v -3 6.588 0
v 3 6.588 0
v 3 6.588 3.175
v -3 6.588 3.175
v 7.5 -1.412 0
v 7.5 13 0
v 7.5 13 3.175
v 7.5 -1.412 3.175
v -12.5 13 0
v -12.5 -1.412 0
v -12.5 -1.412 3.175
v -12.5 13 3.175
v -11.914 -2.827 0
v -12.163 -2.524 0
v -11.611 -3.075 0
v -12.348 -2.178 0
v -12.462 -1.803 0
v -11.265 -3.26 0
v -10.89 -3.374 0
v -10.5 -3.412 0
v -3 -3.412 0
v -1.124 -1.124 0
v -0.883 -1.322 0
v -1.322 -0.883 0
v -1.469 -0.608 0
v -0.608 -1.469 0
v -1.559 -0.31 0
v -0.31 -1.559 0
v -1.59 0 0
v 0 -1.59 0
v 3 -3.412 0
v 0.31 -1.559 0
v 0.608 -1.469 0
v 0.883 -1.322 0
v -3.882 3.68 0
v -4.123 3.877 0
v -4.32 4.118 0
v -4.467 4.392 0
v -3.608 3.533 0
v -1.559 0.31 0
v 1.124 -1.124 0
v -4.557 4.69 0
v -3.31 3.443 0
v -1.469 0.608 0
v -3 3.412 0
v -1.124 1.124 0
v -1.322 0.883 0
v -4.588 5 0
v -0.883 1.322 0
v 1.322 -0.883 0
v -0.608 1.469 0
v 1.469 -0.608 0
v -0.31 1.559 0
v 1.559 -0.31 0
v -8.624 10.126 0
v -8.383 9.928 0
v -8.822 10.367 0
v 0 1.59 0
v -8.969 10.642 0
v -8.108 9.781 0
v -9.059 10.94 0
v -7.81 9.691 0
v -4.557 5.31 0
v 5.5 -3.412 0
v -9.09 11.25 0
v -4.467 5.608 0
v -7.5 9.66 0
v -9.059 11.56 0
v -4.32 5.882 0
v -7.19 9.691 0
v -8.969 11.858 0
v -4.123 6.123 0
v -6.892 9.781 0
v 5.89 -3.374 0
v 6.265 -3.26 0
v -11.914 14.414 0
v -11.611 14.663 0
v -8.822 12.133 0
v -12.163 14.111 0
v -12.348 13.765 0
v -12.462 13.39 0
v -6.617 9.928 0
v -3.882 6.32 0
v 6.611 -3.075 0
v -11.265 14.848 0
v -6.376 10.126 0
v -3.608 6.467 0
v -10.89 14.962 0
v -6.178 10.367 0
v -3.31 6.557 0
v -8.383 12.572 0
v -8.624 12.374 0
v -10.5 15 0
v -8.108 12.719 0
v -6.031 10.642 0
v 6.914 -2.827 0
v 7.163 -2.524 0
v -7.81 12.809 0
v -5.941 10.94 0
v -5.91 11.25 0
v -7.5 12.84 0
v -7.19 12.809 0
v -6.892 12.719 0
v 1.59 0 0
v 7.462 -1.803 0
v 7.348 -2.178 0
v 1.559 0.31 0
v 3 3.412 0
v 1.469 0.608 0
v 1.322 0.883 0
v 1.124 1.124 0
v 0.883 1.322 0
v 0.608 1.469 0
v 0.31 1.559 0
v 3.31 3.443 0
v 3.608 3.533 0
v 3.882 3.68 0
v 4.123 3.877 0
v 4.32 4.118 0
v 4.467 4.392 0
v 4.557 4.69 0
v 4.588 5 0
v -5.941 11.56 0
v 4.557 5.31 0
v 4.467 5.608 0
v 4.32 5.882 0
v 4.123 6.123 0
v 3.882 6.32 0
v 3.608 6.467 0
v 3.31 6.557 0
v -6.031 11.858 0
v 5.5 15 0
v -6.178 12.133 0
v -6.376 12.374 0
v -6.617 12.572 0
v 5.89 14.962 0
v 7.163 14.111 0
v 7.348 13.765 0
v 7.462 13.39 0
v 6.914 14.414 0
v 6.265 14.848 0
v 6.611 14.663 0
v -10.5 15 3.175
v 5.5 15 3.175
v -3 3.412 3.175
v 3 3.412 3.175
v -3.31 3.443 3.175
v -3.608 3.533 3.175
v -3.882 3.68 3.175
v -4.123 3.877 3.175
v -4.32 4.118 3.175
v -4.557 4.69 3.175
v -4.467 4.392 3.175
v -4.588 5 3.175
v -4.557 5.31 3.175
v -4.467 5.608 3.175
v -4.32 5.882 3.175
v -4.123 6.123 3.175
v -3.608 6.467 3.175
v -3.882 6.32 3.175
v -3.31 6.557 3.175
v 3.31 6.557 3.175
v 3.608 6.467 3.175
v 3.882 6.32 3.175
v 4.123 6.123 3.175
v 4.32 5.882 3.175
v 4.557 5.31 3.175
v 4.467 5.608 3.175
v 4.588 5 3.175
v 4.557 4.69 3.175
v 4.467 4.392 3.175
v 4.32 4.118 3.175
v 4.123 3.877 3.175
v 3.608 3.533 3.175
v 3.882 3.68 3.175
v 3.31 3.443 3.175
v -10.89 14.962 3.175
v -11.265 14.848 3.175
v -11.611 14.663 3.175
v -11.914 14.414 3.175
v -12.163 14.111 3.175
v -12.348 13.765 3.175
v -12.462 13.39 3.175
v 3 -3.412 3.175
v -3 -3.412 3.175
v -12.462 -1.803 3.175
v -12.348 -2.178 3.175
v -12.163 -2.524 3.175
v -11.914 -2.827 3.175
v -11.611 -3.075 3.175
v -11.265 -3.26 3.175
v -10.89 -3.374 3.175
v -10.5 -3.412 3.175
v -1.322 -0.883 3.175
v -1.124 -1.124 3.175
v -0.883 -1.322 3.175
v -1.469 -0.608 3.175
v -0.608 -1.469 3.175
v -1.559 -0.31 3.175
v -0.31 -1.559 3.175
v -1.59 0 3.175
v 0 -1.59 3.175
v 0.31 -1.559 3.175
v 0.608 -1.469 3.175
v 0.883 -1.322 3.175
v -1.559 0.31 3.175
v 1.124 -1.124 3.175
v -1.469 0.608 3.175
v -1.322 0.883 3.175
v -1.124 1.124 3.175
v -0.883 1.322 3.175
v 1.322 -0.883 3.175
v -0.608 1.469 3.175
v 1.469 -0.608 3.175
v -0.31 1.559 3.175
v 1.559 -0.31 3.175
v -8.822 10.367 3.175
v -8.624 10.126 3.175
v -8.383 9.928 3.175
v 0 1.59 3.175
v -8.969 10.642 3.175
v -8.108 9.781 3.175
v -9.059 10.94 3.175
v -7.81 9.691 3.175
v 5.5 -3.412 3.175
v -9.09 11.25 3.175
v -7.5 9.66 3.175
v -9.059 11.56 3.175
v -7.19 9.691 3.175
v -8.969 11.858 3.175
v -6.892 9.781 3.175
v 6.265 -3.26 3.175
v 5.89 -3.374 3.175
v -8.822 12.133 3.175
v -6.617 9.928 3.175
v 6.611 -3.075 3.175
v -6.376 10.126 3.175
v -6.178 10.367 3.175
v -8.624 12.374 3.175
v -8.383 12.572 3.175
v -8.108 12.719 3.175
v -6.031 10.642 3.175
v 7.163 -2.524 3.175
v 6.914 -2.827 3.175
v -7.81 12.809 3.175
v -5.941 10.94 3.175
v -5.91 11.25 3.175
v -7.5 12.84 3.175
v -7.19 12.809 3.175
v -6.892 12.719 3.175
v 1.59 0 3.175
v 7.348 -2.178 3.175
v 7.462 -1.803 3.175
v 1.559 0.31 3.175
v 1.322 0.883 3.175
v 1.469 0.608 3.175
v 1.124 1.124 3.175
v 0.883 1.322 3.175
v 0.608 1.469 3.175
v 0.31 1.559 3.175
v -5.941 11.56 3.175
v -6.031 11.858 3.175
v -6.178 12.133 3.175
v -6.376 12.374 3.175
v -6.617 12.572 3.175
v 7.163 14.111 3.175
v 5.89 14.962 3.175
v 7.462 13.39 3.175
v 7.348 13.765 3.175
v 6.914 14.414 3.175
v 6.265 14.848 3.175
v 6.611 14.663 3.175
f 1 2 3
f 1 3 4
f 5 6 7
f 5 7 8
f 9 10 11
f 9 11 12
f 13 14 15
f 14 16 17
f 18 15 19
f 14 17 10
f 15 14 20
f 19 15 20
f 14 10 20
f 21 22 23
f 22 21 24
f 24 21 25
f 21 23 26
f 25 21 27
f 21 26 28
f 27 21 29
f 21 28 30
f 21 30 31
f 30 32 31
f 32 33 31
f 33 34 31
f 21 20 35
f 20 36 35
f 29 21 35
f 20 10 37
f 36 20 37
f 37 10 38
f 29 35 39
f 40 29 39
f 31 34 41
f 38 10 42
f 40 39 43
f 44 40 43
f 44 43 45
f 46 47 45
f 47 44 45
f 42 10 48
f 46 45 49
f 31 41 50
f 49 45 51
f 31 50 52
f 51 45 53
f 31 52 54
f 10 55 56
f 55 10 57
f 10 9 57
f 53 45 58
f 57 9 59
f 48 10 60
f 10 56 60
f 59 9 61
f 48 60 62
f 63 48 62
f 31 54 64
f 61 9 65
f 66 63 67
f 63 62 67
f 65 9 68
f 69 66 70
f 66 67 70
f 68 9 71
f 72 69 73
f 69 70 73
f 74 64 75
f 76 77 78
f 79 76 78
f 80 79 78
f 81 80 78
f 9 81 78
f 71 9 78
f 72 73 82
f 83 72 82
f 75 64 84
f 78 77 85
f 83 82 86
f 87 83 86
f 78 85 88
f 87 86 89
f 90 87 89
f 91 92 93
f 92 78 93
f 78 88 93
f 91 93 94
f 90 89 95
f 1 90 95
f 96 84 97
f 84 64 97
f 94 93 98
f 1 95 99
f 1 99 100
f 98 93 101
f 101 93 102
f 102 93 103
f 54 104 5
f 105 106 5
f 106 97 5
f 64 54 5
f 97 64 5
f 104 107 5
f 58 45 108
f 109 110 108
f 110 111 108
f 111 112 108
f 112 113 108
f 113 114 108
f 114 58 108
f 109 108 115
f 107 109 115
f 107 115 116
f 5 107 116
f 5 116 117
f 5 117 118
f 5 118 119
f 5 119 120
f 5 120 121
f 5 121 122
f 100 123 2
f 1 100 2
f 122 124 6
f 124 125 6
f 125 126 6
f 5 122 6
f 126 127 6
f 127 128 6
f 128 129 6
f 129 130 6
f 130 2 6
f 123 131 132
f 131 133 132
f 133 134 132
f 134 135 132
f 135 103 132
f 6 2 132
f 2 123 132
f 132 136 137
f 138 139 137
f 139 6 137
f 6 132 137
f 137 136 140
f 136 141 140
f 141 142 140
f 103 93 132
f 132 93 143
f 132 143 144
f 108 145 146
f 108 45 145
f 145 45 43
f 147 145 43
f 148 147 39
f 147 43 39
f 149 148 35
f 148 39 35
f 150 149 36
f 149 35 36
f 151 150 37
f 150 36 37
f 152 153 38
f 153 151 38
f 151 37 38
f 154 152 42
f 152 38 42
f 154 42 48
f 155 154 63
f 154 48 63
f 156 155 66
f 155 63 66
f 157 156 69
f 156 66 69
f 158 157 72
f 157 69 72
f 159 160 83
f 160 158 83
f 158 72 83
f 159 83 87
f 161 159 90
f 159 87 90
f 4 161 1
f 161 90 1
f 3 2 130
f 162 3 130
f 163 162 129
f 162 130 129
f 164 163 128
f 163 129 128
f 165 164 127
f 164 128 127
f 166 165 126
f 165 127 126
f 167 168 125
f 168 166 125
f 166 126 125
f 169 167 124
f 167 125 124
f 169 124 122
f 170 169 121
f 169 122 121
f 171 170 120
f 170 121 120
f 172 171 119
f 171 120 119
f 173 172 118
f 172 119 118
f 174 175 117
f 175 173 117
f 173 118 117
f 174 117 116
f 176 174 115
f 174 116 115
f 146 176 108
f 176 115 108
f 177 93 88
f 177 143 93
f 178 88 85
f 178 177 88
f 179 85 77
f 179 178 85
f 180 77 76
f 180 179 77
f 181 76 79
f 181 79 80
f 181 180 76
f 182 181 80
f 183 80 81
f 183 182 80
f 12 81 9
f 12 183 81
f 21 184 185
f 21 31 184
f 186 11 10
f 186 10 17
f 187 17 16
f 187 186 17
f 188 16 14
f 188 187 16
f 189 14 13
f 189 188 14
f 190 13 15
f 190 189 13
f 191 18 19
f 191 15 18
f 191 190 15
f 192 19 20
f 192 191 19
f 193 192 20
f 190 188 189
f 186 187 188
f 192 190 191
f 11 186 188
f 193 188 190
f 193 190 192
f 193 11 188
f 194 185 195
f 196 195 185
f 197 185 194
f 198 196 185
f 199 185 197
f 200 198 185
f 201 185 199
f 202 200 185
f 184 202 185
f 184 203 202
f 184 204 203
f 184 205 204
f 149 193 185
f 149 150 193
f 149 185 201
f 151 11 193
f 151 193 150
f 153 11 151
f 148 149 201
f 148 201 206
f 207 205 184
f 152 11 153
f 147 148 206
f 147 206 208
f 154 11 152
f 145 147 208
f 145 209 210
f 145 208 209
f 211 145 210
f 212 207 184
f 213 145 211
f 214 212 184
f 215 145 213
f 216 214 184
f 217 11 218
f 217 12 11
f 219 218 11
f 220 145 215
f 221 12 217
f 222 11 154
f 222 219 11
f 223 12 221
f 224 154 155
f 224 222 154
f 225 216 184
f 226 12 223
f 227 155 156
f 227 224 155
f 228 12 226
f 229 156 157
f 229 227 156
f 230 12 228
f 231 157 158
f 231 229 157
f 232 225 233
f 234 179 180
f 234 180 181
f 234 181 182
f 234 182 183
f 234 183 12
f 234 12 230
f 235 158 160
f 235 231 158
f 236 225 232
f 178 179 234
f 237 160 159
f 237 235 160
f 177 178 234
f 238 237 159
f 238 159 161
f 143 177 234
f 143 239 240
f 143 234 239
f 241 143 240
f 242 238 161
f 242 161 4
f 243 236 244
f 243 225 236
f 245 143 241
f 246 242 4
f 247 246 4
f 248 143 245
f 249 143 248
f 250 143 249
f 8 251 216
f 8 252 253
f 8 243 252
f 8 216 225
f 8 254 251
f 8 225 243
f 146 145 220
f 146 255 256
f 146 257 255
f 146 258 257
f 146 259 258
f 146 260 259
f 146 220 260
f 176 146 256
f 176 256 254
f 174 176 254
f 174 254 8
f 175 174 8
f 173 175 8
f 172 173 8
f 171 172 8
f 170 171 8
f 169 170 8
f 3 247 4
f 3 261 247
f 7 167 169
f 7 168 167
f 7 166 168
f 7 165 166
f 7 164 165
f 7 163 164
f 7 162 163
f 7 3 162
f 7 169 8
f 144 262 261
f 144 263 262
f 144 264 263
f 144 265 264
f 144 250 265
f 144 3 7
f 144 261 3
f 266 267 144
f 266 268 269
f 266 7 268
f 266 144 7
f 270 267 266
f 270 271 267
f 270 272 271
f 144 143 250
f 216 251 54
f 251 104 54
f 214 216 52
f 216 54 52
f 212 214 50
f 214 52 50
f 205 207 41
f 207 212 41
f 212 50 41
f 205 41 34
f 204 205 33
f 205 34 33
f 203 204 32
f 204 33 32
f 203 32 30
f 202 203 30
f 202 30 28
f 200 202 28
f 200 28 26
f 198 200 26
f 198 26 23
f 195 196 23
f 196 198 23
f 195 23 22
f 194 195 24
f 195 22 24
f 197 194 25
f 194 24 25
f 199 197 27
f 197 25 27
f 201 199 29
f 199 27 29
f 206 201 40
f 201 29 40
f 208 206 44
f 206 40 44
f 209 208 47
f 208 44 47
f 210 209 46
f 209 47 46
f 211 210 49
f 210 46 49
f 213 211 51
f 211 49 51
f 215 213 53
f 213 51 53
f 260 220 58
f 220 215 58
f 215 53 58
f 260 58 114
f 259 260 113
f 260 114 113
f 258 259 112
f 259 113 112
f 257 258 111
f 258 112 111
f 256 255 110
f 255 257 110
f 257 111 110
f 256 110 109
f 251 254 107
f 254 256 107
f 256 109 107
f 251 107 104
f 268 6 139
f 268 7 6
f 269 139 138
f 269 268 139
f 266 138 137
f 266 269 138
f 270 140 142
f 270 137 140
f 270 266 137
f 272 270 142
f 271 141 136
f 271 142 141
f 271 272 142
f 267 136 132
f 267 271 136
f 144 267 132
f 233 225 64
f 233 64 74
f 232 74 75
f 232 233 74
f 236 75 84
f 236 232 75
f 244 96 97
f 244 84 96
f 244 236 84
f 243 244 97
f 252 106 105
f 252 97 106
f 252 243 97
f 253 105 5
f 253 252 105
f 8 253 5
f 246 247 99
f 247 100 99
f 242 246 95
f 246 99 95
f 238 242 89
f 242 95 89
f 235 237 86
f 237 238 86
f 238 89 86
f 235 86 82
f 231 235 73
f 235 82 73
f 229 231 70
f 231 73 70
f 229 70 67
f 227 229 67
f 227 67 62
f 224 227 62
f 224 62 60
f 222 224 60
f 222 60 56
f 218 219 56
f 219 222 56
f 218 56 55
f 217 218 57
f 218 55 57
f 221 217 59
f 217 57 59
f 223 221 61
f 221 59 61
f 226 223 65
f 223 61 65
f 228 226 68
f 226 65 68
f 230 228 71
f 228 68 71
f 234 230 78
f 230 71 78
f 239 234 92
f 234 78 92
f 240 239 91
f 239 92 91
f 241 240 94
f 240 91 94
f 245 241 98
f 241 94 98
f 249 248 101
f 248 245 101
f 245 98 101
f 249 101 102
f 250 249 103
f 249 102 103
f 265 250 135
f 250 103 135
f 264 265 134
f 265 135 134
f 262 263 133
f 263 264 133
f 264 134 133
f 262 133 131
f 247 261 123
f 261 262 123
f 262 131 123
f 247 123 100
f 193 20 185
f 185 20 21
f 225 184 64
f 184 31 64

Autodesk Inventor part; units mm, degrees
ref_plane "YZ Plane" through (0, 0, 0) normal (1, 0, 0) x (0, 1, 0)
ref_plane "XZ Plane" through (0, 0, 0) normal (0, 1, 0) x (-1, 0, 0)
ref_plane "XY Plane" through (0, 0, 0) normal (0, 0, 1) x (1, 0, 0)
sketch "Sketch1" plane through (0, 0, 0) normal (0, 0, 1) x (1, 0, 0)
  circle A0 centre (0, 0) radius 1.59
  line L0 (-12.5, 15) -> (7.5, 15)
  line L1 (7.5, 15) -> (7.5, -15)
  line L2 (7.5, -15) -> (-12.5, -15)
  line L3 (-12.5, -15) -> (-12.5, 15)
  circle A1 centre (-7.5, 11.25) radius 1.59
  line L4 (-3, 5) -> (3, 5) construction
  line L5 (-3, 3.4125) -> (3, 3.4125)
  line L6 (3, 6.5875) -> (-3, 6.5875)
  arc A2 (-3, 6.5875) -> (-3, 3.4125) centre (-3, 5) ccw
  arc A3 (3, 3.4125) -> (3, 6.5875) centre (3, 5) ccw
  line L7 (-3, -5) -> (3, -5) construction
  line L8 (-3, -6.5875) -> (3, -6.5875)
  line L9 (3, -3.4125) -> (-3, -3.4125)
  arc A4 (-3, -3.4125) -> (-3, -6.5875) centre (-3, -5) ccw
  arc A5 (3, -6.5875) -> (3, -3.4125) centre (3, -5) ccw
  line L10 (-12.5, -3.4125) -> (7.5, -3.4125)
  point P0 (7.5, 0)
  point P1 (0, 5)
  point P2 (0, -5)
  point P3 (0, 0)
  dimension "d2" = 3.18
  dimension "d31" = 20
  dimension "d32" = 30
  dimension "d33" = 10
  dimension "d35" = 5
  dimension "d39" = 3.175
  dimension "d41" = 6
  dimension "d42" = 9.175
  dimension "d44" = 7.5
  dimension "d45" = 15
  dimension "d46" = 11.25
extrude "Extrusion1" add sketch "Sketch1" along normal blind 3.175 contours L0 L1 L10 L9 L3
fillet "Fillet1" radius 2 4 edges at (-12.5, 15, 1.5875) (7.5, 15, 1.5875) (7.5, -3.4125, 1.5875) (-12.5, -3.4125, 1.5875)
equation "\"d35\" = 0.5 * d33"
equation "\"d12\" = THICKA"
equation "\"THICKA\" = 3.175"
equation "\"THICKB\" = 6.731"
equation "\"THICKC\" = 12.7"
equation "\"MAGDIA\" = 9.5"
equation "\"BALLDIA\" = 12"
equation "\"THICKPLY\" = 5"
properties part number "Carriage_Joint_Beltflap"
